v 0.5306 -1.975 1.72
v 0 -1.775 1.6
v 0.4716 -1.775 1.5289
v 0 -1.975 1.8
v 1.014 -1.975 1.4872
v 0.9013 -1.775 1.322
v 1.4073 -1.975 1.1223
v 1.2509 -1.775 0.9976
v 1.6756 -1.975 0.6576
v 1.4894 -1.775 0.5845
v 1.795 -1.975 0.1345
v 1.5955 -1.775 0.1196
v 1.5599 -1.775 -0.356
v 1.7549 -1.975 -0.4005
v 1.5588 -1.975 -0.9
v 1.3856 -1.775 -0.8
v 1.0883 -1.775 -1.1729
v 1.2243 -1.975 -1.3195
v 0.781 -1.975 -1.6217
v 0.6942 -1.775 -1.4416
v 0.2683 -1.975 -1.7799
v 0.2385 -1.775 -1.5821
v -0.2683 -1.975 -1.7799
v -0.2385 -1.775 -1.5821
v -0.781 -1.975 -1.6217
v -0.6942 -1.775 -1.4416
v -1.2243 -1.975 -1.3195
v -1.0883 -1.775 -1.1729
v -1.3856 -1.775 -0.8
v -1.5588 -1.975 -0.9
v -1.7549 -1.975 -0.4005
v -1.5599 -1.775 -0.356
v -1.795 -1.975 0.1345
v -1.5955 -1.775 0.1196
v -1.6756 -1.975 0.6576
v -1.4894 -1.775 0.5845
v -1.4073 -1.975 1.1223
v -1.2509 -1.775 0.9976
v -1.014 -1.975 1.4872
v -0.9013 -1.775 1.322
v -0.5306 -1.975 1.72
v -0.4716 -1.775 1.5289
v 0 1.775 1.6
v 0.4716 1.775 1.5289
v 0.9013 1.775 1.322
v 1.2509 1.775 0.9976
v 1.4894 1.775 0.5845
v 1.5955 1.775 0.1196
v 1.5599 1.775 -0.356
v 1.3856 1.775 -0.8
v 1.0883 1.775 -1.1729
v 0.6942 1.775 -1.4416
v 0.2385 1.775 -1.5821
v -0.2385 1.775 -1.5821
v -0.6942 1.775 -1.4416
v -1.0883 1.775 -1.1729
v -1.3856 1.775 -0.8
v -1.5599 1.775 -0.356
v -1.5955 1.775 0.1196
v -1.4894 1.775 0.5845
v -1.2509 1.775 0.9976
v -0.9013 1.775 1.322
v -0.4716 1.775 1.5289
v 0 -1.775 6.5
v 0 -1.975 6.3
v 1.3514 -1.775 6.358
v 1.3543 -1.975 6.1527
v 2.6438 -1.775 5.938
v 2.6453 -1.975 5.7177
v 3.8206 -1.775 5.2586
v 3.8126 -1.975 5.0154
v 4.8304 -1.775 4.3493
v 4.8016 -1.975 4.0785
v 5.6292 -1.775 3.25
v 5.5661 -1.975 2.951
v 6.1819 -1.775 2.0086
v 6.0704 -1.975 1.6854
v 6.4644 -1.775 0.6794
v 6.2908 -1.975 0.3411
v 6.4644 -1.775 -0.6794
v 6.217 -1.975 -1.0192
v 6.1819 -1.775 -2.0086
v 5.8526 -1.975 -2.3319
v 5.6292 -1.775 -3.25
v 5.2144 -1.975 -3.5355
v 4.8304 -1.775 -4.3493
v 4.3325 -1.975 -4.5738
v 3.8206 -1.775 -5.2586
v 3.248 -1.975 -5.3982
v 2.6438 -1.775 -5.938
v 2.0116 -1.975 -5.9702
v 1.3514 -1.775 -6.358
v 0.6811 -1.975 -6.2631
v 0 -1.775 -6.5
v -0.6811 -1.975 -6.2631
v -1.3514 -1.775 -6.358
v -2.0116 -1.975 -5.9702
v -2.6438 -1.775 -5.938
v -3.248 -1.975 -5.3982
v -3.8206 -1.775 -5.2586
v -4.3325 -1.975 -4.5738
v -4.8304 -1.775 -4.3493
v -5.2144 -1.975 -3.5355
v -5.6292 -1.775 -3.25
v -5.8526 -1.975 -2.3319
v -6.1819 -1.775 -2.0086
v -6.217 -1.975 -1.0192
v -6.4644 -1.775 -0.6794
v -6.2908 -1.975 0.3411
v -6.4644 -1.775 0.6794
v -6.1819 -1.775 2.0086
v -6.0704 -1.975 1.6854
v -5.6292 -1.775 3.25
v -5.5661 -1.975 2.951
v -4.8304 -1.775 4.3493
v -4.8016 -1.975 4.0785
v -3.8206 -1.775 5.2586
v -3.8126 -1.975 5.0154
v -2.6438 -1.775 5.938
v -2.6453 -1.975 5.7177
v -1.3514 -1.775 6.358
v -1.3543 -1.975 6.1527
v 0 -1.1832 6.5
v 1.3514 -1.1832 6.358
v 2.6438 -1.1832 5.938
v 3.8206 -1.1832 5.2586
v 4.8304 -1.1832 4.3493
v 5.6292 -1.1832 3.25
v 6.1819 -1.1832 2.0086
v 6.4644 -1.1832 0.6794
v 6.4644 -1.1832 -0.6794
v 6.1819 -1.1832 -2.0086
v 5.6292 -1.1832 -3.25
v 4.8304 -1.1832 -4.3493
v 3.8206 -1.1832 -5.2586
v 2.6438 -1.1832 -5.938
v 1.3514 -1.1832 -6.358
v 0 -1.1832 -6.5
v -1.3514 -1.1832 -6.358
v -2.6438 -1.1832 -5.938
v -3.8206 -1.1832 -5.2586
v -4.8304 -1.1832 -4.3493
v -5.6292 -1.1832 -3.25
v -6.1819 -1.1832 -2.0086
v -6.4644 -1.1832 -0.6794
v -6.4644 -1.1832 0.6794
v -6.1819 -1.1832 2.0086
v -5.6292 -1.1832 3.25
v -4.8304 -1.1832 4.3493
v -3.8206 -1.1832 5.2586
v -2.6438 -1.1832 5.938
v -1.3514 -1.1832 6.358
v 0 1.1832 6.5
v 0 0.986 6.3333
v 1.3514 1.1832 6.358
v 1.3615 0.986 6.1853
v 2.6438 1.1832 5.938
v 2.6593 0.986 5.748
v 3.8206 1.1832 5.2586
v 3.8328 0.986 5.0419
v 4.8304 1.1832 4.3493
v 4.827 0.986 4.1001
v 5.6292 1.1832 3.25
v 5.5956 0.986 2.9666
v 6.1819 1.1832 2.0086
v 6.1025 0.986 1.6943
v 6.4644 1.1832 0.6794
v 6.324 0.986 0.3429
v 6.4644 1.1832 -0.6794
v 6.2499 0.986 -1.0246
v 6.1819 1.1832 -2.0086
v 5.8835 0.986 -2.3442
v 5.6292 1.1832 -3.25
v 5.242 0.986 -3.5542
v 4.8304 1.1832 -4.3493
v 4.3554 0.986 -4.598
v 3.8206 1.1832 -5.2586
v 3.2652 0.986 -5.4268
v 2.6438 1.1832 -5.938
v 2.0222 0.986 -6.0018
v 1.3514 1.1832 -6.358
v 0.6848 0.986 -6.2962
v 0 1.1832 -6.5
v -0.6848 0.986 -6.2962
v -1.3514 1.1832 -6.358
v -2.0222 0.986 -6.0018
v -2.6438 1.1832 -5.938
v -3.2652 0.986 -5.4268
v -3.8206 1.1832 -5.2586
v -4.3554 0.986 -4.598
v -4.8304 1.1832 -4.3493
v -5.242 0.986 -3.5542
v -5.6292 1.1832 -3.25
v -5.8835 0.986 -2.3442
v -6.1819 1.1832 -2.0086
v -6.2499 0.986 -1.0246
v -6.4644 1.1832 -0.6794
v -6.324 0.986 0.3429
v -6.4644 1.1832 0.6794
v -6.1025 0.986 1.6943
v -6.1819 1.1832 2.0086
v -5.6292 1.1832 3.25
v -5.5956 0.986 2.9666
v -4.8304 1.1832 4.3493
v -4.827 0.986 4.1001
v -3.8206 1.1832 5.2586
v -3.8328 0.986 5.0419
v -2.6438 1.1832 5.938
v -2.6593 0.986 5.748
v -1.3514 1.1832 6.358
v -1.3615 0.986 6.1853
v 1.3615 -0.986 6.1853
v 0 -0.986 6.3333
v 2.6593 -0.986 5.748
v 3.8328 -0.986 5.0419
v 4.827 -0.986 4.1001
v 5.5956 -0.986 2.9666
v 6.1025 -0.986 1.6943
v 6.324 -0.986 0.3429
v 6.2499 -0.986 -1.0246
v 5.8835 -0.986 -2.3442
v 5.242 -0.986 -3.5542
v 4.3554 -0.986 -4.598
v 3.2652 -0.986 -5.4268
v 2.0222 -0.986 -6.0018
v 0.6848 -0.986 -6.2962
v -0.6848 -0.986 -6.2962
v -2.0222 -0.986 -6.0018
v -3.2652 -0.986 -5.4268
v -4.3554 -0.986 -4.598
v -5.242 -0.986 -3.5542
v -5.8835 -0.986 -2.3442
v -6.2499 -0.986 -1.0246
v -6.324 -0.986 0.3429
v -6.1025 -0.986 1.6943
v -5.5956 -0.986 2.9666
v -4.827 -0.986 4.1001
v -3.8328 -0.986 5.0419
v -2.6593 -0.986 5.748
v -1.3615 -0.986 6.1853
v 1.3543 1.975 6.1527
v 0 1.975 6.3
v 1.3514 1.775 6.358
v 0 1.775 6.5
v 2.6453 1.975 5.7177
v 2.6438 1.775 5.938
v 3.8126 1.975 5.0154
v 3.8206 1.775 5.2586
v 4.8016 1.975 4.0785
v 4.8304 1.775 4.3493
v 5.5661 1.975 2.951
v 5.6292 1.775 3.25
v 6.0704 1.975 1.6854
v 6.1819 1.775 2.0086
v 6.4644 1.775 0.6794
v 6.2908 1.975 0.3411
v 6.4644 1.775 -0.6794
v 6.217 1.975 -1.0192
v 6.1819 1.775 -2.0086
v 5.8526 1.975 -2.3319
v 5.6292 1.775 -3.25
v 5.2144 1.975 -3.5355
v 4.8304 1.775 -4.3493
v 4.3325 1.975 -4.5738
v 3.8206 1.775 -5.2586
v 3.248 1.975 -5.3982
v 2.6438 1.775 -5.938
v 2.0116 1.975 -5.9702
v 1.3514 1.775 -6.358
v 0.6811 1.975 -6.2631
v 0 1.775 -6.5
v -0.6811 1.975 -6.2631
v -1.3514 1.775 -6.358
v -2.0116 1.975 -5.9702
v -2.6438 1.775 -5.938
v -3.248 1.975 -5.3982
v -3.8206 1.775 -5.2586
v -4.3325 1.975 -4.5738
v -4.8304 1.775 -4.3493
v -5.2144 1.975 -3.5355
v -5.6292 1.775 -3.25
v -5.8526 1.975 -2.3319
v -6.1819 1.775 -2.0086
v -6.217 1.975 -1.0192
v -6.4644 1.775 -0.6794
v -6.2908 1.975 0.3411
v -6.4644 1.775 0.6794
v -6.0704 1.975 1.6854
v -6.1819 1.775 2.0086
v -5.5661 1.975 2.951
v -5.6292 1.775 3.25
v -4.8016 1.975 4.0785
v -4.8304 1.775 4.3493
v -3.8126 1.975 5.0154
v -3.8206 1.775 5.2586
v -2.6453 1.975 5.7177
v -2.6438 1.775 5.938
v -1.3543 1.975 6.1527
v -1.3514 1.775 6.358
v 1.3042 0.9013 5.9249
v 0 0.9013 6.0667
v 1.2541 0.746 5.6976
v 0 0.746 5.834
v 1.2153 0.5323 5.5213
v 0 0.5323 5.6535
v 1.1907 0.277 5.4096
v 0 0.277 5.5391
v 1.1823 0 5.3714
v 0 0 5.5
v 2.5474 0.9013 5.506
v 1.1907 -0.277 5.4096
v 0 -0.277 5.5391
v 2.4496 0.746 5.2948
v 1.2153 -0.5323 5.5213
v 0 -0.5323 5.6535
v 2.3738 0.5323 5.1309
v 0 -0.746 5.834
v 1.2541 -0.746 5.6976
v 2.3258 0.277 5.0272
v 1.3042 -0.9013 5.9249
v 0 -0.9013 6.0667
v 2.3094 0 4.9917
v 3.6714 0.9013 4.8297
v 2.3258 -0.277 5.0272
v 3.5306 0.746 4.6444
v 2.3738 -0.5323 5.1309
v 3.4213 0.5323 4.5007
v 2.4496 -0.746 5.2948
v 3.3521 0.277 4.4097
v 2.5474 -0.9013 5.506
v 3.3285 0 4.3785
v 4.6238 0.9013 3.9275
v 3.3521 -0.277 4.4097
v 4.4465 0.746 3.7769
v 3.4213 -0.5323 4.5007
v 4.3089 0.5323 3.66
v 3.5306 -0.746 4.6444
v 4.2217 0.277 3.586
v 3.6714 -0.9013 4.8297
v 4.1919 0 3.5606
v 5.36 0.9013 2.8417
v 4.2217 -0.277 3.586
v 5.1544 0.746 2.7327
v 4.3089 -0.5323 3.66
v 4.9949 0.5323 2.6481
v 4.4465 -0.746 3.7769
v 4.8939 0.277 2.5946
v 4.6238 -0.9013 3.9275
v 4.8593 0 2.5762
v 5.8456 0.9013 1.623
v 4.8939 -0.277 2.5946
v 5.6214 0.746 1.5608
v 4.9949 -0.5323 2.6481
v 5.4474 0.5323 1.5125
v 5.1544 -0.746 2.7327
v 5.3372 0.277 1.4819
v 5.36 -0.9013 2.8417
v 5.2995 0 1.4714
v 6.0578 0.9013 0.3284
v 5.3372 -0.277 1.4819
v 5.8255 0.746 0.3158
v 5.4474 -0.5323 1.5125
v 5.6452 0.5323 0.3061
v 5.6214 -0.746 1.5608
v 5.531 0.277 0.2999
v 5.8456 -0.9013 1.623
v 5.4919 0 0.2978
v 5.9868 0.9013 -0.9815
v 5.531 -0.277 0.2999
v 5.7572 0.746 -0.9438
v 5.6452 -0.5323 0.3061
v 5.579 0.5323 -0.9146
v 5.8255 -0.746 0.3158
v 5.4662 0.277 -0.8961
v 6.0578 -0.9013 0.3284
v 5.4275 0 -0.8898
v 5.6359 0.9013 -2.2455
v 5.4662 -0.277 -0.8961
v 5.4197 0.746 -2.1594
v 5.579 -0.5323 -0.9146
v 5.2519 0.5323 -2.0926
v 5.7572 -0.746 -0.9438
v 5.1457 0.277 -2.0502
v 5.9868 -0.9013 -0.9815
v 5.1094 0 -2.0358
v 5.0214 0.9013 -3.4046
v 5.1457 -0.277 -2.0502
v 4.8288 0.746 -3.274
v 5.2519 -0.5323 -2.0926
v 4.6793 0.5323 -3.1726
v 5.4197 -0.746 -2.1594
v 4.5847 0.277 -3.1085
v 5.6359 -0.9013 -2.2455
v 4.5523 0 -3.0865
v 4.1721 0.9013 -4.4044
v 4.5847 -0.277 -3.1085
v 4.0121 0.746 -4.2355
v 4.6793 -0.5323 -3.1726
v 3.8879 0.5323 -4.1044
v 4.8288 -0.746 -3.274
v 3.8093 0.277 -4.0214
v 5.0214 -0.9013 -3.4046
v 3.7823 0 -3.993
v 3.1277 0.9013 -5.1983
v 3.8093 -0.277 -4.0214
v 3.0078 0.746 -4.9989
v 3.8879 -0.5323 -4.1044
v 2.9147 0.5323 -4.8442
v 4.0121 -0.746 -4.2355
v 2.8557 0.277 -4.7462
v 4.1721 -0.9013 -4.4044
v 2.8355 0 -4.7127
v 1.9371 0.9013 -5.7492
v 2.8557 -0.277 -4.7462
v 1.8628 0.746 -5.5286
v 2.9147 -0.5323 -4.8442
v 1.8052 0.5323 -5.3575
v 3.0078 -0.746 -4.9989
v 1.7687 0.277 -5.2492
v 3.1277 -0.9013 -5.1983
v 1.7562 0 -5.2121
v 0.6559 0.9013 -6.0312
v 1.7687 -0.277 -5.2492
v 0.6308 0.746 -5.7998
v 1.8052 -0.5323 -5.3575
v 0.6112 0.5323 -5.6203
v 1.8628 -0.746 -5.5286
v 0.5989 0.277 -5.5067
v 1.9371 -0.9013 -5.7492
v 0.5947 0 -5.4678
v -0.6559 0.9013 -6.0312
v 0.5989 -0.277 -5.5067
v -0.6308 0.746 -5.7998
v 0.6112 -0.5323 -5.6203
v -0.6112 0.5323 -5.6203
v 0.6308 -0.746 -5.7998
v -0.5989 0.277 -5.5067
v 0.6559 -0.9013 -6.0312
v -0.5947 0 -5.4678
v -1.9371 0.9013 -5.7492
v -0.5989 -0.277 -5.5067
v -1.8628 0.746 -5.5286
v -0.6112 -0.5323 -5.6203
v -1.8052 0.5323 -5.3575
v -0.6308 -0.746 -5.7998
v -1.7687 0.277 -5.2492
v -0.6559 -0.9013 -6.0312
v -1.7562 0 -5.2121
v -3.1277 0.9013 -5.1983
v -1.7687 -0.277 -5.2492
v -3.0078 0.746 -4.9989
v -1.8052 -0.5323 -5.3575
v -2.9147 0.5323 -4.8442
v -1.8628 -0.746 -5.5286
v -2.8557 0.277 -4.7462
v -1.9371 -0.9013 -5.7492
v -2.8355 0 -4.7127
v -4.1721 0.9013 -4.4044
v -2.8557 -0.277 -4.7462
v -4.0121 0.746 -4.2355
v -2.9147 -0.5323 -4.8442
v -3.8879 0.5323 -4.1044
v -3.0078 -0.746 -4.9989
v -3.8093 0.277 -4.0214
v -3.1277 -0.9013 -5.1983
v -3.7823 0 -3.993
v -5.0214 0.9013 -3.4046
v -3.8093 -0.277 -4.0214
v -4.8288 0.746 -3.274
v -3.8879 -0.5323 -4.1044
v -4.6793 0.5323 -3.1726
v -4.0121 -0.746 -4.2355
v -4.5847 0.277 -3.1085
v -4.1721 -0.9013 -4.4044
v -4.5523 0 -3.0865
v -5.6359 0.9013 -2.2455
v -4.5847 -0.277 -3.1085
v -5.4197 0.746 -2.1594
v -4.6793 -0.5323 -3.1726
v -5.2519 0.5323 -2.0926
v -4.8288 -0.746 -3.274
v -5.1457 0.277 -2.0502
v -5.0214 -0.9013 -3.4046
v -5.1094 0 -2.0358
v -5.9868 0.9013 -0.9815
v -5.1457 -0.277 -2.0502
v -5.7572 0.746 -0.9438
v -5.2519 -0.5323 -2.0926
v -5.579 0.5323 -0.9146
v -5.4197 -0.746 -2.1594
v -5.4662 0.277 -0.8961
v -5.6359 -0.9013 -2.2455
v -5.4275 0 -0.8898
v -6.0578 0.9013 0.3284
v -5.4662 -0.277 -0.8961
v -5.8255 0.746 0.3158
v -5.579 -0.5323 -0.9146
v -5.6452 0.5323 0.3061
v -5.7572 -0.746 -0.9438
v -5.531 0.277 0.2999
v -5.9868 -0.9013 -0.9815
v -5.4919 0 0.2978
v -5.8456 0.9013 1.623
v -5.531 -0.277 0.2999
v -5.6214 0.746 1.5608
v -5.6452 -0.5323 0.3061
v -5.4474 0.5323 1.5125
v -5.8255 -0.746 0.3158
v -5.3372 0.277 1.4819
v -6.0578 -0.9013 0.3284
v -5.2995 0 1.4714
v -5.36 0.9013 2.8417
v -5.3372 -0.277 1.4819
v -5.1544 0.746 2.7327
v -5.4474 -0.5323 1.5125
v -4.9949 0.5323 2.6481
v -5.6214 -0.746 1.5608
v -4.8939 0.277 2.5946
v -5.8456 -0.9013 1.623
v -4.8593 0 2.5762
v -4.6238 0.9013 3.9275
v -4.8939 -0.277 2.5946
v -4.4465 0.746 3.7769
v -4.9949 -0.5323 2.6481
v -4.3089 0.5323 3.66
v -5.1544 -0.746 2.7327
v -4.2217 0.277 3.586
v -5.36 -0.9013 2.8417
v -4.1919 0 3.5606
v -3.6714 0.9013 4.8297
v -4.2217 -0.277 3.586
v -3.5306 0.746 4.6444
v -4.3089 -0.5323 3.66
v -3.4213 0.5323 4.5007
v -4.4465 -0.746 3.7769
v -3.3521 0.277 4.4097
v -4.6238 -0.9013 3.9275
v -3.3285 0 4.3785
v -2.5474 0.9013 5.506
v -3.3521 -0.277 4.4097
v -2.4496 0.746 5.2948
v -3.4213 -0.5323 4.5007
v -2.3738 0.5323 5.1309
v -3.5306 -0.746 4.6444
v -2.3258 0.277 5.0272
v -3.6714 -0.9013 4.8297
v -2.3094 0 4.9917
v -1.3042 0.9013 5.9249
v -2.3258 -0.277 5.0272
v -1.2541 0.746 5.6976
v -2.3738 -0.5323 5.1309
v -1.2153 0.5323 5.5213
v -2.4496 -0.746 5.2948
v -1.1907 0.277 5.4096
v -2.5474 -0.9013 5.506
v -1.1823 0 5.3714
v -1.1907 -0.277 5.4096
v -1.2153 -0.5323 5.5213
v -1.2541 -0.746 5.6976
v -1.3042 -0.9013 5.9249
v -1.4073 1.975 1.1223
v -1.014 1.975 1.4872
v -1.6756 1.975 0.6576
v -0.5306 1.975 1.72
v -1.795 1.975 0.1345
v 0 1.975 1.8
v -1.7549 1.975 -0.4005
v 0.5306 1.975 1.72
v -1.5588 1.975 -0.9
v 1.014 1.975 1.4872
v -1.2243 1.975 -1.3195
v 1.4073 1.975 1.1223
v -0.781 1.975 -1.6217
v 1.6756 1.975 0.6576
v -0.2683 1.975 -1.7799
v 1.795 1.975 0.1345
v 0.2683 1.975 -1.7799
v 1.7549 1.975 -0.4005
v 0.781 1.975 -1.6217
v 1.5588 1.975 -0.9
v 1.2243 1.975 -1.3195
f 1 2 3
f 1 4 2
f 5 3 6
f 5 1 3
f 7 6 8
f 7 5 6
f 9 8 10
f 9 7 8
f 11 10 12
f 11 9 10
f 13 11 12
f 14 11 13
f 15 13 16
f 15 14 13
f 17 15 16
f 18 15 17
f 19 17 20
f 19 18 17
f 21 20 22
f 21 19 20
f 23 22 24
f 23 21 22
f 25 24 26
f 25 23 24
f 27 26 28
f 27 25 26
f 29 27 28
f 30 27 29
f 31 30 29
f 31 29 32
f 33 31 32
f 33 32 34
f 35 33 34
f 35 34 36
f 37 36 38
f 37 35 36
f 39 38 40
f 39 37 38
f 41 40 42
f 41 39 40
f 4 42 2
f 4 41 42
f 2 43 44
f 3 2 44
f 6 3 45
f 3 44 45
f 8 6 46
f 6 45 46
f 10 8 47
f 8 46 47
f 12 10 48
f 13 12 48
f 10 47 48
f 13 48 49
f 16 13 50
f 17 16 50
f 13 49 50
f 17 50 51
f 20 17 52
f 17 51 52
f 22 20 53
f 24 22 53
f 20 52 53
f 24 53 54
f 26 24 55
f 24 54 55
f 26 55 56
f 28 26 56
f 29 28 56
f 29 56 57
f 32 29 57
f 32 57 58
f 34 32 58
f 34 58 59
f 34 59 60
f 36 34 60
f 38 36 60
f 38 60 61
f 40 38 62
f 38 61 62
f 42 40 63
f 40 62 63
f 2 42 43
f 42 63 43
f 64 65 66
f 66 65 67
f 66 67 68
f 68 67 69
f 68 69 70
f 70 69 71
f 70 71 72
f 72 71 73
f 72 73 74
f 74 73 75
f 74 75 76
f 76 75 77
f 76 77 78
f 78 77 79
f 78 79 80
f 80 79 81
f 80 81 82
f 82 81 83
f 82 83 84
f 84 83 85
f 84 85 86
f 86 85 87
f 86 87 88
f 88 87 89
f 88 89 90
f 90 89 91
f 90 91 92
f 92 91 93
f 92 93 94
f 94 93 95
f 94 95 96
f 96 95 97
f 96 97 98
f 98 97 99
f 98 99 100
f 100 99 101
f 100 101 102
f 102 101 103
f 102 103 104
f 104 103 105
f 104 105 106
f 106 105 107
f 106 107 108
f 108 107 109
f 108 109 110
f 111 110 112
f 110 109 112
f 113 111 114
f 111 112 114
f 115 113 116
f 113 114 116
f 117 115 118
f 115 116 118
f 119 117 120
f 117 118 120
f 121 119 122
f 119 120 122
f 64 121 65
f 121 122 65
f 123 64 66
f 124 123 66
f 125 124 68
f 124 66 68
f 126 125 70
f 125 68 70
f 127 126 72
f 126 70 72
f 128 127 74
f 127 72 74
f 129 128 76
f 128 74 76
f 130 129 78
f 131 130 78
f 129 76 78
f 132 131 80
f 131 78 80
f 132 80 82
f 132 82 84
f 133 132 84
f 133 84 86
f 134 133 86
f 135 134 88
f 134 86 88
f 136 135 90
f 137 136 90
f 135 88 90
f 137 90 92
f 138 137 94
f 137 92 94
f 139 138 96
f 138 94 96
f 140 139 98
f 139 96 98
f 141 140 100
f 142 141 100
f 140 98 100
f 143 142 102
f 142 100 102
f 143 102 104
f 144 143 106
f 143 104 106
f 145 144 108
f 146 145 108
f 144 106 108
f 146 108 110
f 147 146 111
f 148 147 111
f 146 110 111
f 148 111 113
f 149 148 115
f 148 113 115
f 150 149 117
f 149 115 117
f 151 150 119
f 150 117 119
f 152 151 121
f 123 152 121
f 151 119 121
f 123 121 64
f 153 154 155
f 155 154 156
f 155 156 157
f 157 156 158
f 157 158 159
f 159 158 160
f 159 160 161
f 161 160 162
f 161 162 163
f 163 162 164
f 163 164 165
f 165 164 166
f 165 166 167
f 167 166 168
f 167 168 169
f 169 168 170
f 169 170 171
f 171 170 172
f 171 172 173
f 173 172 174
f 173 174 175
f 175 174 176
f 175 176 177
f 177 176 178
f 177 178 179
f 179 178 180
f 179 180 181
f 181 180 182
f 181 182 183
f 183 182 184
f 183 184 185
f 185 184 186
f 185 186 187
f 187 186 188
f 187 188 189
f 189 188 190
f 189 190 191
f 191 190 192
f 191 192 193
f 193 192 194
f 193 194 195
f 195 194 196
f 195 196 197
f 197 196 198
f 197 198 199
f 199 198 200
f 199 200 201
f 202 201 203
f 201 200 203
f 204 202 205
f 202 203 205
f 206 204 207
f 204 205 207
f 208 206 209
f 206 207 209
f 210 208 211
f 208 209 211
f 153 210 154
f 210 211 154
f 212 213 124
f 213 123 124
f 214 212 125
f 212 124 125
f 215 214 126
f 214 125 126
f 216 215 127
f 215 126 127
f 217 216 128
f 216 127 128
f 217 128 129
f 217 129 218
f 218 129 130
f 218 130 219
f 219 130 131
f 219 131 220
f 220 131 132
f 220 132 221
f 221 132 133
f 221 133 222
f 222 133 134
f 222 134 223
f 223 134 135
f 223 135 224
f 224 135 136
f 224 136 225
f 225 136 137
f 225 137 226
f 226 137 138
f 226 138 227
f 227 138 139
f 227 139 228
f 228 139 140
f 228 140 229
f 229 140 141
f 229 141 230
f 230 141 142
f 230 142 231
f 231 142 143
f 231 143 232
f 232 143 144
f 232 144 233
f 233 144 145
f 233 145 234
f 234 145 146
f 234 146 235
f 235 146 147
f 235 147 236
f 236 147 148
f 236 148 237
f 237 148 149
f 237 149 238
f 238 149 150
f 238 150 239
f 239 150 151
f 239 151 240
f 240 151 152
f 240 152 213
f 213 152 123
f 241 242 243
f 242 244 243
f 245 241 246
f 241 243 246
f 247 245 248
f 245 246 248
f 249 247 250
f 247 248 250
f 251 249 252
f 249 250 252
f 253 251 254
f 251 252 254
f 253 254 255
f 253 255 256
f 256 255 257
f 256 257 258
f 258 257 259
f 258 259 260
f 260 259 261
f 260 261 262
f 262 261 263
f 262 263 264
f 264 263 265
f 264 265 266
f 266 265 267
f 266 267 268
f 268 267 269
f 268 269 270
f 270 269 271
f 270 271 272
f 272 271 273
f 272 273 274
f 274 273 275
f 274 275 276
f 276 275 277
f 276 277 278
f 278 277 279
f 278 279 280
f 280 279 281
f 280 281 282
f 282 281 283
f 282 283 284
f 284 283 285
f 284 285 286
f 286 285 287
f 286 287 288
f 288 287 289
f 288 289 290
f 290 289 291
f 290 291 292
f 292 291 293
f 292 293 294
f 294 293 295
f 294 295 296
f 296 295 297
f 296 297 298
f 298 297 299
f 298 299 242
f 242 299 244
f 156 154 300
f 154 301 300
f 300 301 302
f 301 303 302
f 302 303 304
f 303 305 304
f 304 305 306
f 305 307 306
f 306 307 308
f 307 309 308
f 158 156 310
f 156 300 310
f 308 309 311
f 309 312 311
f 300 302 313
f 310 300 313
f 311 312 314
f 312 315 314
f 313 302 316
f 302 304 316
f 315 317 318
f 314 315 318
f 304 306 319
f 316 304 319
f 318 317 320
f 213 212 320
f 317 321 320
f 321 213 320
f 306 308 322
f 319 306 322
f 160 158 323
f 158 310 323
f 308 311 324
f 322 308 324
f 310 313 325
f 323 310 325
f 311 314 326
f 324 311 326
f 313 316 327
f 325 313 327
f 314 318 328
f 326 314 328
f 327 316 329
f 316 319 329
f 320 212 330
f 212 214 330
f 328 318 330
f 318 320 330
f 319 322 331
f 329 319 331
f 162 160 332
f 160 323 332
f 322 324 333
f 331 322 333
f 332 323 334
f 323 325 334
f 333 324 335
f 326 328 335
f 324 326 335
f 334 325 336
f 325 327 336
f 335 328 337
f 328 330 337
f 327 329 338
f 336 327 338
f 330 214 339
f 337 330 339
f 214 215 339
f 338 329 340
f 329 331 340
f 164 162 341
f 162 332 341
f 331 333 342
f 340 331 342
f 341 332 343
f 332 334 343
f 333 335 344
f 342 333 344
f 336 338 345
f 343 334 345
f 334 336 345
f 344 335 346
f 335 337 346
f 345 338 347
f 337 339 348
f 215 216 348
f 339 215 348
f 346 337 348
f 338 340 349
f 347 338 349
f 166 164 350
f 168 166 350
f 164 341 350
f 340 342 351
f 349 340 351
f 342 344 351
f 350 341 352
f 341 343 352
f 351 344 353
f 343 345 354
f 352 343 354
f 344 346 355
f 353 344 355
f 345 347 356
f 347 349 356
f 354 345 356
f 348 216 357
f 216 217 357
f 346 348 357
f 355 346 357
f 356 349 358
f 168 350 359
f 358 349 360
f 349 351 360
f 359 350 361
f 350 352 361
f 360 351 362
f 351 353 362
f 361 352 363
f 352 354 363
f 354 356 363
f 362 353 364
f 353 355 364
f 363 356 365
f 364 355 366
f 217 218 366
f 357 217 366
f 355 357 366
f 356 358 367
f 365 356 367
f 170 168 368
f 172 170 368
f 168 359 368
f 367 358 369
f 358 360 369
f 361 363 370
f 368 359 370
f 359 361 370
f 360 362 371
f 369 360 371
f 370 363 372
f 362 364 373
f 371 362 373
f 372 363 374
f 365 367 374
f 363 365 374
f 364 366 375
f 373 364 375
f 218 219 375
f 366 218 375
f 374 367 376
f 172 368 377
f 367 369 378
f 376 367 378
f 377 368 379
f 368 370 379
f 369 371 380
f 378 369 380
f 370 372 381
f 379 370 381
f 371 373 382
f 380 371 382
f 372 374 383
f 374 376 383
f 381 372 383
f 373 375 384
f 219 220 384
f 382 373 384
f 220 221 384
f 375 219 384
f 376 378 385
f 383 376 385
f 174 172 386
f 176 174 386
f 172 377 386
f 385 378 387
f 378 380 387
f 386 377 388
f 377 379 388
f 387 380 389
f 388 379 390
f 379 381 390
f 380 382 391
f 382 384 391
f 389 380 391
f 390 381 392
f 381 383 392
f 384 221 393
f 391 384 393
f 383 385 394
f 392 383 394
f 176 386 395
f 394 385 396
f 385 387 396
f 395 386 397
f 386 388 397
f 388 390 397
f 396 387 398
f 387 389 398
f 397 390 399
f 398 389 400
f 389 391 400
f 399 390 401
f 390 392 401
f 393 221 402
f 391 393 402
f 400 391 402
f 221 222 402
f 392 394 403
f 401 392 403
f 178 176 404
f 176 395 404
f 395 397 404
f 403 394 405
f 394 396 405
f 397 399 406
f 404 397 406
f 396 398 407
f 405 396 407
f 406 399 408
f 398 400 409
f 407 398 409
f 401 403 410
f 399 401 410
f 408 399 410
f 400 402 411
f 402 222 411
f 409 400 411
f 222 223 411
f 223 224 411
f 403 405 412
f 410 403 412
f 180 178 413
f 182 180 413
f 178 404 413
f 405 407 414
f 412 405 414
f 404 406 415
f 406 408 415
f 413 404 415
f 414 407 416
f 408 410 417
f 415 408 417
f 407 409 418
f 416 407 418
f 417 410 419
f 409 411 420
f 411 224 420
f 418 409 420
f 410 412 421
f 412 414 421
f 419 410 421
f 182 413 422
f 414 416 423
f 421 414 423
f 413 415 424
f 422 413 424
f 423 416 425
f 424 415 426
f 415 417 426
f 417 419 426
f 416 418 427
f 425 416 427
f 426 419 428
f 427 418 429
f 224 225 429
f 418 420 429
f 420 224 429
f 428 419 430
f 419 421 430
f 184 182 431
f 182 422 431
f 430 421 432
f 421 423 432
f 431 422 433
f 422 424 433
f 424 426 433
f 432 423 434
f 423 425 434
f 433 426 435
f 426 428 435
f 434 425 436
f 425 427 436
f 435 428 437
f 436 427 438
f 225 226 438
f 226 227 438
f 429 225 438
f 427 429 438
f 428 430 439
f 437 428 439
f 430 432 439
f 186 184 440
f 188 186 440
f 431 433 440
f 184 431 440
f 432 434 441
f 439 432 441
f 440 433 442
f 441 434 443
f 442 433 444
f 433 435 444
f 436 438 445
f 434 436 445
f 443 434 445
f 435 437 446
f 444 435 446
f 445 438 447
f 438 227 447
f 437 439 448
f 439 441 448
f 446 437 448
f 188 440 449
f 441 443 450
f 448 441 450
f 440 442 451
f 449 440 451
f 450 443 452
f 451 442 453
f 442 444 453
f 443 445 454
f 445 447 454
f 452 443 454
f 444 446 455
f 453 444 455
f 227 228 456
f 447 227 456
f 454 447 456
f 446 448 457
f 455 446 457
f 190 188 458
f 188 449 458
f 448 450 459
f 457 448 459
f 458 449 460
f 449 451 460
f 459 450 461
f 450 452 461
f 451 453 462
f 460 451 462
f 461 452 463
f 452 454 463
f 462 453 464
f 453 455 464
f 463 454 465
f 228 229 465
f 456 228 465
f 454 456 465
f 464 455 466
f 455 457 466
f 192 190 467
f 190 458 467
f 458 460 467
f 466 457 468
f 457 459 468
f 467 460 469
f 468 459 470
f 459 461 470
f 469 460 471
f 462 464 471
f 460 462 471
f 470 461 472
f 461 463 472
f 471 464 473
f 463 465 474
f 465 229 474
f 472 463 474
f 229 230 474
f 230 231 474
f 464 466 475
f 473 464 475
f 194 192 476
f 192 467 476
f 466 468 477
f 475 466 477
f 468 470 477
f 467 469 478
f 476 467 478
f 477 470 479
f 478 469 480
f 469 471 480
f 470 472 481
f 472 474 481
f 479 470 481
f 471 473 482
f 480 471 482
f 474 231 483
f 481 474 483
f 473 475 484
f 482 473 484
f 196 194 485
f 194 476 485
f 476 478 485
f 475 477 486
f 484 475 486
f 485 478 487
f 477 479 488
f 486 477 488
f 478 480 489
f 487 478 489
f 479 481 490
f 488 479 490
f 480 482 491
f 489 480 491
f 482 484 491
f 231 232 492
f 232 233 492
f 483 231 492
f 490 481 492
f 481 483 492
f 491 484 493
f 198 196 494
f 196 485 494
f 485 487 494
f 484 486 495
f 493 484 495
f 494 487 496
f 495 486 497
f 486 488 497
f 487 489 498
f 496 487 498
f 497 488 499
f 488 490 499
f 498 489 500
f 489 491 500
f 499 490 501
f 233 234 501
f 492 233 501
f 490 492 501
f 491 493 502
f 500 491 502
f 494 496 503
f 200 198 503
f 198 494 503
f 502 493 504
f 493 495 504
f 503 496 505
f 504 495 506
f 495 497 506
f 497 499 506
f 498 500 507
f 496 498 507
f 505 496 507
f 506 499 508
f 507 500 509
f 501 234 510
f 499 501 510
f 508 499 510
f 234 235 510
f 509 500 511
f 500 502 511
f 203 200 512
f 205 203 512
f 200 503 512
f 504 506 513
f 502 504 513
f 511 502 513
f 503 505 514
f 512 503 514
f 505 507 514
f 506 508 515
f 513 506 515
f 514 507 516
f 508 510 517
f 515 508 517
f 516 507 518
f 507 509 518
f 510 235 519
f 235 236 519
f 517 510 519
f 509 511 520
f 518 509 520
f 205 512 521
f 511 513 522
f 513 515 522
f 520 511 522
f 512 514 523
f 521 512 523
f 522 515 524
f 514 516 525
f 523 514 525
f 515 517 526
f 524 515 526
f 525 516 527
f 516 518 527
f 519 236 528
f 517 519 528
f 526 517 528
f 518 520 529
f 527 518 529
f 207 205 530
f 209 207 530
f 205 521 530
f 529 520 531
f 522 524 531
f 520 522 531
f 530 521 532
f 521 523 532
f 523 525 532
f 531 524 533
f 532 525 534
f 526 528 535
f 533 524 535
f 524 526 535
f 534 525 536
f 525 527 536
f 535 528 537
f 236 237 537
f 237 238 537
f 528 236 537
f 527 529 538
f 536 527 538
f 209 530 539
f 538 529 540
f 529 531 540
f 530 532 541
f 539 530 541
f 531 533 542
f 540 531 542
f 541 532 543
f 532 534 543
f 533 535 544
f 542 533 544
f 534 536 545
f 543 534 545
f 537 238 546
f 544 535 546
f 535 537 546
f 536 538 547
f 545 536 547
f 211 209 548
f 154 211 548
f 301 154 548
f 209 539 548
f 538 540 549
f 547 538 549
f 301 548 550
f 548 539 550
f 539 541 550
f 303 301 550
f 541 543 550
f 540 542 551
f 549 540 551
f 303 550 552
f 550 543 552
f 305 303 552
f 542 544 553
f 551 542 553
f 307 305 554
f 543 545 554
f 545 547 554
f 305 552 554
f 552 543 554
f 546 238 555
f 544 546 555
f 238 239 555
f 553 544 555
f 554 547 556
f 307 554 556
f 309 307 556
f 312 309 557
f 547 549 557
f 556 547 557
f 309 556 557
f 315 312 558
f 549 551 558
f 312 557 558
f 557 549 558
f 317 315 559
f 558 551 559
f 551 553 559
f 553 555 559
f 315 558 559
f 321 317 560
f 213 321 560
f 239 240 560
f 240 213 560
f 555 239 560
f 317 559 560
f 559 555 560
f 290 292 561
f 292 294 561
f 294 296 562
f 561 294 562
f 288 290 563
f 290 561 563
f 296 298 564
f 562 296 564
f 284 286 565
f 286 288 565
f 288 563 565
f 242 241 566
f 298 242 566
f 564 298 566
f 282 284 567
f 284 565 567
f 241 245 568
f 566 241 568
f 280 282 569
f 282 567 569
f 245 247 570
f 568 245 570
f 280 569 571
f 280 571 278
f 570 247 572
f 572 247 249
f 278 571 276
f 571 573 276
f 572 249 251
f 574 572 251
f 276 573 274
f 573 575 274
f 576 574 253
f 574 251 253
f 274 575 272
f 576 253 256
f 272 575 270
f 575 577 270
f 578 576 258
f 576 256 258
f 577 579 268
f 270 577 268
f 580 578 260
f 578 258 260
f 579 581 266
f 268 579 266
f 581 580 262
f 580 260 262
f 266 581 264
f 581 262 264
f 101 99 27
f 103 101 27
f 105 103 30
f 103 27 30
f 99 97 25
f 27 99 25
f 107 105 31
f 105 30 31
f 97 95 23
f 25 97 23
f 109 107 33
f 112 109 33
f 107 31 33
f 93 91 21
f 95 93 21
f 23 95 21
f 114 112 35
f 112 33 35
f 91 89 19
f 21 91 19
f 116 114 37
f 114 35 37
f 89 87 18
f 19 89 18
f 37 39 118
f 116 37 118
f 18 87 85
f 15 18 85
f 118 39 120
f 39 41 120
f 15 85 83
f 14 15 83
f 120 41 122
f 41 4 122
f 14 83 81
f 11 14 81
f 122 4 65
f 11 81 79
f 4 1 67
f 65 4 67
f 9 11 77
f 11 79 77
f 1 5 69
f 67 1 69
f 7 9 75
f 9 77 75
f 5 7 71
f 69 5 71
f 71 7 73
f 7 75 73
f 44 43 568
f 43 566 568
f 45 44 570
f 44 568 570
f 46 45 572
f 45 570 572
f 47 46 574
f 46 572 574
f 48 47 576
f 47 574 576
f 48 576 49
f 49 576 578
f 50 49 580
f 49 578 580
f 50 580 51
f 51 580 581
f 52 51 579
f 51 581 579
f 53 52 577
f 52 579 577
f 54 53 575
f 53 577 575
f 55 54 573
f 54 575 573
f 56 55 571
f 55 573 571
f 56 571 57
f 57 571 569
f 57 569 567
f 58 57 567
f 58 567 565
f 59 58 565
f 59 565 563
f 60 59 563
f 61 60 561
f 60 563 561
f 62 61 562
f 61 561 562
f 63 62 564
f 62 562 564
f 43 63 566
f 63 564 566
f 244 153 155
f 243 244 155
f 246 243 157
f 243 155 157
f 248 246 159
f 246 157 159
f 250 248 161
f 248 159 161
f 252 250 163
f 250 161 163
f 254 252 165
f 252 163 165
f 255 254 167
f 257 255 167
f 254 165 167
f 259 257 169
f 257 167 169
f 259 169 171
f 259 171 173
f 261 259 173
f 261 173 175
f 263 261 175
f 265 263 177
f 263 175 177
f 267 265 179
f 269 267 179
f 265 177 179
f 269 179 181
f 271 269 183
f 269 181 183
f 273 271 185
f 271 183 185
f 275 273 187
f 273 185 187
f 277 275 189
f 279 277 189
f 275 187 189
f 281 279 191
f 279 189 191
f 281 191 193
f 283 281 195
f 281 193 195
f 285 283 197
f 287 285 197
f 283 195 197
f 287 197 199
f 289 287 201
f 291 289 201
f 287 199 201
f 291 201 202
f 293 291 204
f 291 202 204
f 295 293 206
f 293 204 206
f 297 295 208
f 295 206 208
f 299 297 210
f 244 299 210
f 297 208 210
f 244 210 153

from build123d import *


# Not quite as in the source:
# - a fillet or chamfer that OpenCascade refuses, or shapes differently, is made with other operations: its cross-section is extruded or revolved along the edge and cut away or added


with BuildPart() as f1:
    # F0 (on Right) → F1 (revolve)
    with BuildSketch(Plane.YZ):
        with BuildLine():
            Line((-1.975, 1.6), (0, 1.6))
            Line((0, 1.6), (1.975, 1.6))
            Line((1.975, 1.6), (1.975, 6.5))
            Line((1.975, 6.5), (1, 6.5))
            ThreePointArc((1, 6.5), (0, 5.5), (-1, 6.5))
            Line((-1, 6.5), (-1.975, 6.5))
            Line((-1.975, 6.5), (-1.975, 1.6))
        make_face()
    revolve(axis=Axis((0, 2.5333669037, 0), (0, 1, 0)))

    # F2: chamfer of 0.2 on 9 edges, made by hand

    # F2_s1 → F2_t2 (revolve, cut)
    with BuildSketch(Plane.YZ):
        Polygon((-1.775, 1.6), (-1.975, 1.8), (-1.975, 1.6), align=None)
    revolve(axis=Axis((0, -1.975, 0), (0, 1, 0)), mode=Mode.SUBTRACT)

    # F2_s3 → F2_t4 (revolve, cut)
    with BuildSketch(Plane.YZ):
        Polygon((1.775, 1.6), (1.975, 1.8), (1.975, 1.6), align=None)
    revolve(axis=Axis((0, 1.975, 0), (0, 1, 0)), mode=Mode.SUBTRACT)

    # F2_s5 → F2_t6 (revolve, cut)
    with BuildSketch(Plane.YZ):
        with BuildLine():
            Line((-0.9860132972, 6.3333333333), (-1.1832159566, 6.5))
            Line((-1.1832159566, 6.5), (-1, 6.5))
            ThreePointArc((-1, 6.5), (-0.9962551156, 6.4135376119), (-0.9860132972, 6.3333333333))
        make_face()
    revolve(axis=Axis((0, -1, 0), (0, 1, 0)), mode=Mode.SUBTRACT)

    # F2_s7 → F2_t8 (revolve, cut)
    with BuildSketch(Plane.YZ):
        Polygon((-1.775, 6.5), (-1.975, 6.3), (-1.975, 6.5), align=None)
    revolve(axis=Axis((0, -1.975, 0), (0, 1, 0)), mode=Mode.SUBTRACT)

    # F2_s9 → F2_t10 (revolve, cut)
    with BuildSketch(Plane.YZ):
        Polygon((1.975, 6.3), (1.775, 6.5), (1.975, 6.5), align=None)
    revolve(axis=Axis((0, 1.975, 0), (0, 1, 0)), mode=Mode.SUBTRACT)

    # F2_s11 → F2_t12 (revolve, cut)
    with BuildSketch(Plane.YZ):
        with BuildLine():
            Line((1.1832159566, 6.5), (0.9860132972, 6.3333333333))
            ThreePointArc((0.9860132972, 6.3333333333), (0.9962551156, 6.4135376119), (1, 6.5))
            Line((1, 6.5), (1.1832159566, 6.5))
        make_face()
    revolve(axis=Axis((0, 1, 0), (0, 1, 0)), mode=Mode.SUBTRACT)


solid = f1.part
